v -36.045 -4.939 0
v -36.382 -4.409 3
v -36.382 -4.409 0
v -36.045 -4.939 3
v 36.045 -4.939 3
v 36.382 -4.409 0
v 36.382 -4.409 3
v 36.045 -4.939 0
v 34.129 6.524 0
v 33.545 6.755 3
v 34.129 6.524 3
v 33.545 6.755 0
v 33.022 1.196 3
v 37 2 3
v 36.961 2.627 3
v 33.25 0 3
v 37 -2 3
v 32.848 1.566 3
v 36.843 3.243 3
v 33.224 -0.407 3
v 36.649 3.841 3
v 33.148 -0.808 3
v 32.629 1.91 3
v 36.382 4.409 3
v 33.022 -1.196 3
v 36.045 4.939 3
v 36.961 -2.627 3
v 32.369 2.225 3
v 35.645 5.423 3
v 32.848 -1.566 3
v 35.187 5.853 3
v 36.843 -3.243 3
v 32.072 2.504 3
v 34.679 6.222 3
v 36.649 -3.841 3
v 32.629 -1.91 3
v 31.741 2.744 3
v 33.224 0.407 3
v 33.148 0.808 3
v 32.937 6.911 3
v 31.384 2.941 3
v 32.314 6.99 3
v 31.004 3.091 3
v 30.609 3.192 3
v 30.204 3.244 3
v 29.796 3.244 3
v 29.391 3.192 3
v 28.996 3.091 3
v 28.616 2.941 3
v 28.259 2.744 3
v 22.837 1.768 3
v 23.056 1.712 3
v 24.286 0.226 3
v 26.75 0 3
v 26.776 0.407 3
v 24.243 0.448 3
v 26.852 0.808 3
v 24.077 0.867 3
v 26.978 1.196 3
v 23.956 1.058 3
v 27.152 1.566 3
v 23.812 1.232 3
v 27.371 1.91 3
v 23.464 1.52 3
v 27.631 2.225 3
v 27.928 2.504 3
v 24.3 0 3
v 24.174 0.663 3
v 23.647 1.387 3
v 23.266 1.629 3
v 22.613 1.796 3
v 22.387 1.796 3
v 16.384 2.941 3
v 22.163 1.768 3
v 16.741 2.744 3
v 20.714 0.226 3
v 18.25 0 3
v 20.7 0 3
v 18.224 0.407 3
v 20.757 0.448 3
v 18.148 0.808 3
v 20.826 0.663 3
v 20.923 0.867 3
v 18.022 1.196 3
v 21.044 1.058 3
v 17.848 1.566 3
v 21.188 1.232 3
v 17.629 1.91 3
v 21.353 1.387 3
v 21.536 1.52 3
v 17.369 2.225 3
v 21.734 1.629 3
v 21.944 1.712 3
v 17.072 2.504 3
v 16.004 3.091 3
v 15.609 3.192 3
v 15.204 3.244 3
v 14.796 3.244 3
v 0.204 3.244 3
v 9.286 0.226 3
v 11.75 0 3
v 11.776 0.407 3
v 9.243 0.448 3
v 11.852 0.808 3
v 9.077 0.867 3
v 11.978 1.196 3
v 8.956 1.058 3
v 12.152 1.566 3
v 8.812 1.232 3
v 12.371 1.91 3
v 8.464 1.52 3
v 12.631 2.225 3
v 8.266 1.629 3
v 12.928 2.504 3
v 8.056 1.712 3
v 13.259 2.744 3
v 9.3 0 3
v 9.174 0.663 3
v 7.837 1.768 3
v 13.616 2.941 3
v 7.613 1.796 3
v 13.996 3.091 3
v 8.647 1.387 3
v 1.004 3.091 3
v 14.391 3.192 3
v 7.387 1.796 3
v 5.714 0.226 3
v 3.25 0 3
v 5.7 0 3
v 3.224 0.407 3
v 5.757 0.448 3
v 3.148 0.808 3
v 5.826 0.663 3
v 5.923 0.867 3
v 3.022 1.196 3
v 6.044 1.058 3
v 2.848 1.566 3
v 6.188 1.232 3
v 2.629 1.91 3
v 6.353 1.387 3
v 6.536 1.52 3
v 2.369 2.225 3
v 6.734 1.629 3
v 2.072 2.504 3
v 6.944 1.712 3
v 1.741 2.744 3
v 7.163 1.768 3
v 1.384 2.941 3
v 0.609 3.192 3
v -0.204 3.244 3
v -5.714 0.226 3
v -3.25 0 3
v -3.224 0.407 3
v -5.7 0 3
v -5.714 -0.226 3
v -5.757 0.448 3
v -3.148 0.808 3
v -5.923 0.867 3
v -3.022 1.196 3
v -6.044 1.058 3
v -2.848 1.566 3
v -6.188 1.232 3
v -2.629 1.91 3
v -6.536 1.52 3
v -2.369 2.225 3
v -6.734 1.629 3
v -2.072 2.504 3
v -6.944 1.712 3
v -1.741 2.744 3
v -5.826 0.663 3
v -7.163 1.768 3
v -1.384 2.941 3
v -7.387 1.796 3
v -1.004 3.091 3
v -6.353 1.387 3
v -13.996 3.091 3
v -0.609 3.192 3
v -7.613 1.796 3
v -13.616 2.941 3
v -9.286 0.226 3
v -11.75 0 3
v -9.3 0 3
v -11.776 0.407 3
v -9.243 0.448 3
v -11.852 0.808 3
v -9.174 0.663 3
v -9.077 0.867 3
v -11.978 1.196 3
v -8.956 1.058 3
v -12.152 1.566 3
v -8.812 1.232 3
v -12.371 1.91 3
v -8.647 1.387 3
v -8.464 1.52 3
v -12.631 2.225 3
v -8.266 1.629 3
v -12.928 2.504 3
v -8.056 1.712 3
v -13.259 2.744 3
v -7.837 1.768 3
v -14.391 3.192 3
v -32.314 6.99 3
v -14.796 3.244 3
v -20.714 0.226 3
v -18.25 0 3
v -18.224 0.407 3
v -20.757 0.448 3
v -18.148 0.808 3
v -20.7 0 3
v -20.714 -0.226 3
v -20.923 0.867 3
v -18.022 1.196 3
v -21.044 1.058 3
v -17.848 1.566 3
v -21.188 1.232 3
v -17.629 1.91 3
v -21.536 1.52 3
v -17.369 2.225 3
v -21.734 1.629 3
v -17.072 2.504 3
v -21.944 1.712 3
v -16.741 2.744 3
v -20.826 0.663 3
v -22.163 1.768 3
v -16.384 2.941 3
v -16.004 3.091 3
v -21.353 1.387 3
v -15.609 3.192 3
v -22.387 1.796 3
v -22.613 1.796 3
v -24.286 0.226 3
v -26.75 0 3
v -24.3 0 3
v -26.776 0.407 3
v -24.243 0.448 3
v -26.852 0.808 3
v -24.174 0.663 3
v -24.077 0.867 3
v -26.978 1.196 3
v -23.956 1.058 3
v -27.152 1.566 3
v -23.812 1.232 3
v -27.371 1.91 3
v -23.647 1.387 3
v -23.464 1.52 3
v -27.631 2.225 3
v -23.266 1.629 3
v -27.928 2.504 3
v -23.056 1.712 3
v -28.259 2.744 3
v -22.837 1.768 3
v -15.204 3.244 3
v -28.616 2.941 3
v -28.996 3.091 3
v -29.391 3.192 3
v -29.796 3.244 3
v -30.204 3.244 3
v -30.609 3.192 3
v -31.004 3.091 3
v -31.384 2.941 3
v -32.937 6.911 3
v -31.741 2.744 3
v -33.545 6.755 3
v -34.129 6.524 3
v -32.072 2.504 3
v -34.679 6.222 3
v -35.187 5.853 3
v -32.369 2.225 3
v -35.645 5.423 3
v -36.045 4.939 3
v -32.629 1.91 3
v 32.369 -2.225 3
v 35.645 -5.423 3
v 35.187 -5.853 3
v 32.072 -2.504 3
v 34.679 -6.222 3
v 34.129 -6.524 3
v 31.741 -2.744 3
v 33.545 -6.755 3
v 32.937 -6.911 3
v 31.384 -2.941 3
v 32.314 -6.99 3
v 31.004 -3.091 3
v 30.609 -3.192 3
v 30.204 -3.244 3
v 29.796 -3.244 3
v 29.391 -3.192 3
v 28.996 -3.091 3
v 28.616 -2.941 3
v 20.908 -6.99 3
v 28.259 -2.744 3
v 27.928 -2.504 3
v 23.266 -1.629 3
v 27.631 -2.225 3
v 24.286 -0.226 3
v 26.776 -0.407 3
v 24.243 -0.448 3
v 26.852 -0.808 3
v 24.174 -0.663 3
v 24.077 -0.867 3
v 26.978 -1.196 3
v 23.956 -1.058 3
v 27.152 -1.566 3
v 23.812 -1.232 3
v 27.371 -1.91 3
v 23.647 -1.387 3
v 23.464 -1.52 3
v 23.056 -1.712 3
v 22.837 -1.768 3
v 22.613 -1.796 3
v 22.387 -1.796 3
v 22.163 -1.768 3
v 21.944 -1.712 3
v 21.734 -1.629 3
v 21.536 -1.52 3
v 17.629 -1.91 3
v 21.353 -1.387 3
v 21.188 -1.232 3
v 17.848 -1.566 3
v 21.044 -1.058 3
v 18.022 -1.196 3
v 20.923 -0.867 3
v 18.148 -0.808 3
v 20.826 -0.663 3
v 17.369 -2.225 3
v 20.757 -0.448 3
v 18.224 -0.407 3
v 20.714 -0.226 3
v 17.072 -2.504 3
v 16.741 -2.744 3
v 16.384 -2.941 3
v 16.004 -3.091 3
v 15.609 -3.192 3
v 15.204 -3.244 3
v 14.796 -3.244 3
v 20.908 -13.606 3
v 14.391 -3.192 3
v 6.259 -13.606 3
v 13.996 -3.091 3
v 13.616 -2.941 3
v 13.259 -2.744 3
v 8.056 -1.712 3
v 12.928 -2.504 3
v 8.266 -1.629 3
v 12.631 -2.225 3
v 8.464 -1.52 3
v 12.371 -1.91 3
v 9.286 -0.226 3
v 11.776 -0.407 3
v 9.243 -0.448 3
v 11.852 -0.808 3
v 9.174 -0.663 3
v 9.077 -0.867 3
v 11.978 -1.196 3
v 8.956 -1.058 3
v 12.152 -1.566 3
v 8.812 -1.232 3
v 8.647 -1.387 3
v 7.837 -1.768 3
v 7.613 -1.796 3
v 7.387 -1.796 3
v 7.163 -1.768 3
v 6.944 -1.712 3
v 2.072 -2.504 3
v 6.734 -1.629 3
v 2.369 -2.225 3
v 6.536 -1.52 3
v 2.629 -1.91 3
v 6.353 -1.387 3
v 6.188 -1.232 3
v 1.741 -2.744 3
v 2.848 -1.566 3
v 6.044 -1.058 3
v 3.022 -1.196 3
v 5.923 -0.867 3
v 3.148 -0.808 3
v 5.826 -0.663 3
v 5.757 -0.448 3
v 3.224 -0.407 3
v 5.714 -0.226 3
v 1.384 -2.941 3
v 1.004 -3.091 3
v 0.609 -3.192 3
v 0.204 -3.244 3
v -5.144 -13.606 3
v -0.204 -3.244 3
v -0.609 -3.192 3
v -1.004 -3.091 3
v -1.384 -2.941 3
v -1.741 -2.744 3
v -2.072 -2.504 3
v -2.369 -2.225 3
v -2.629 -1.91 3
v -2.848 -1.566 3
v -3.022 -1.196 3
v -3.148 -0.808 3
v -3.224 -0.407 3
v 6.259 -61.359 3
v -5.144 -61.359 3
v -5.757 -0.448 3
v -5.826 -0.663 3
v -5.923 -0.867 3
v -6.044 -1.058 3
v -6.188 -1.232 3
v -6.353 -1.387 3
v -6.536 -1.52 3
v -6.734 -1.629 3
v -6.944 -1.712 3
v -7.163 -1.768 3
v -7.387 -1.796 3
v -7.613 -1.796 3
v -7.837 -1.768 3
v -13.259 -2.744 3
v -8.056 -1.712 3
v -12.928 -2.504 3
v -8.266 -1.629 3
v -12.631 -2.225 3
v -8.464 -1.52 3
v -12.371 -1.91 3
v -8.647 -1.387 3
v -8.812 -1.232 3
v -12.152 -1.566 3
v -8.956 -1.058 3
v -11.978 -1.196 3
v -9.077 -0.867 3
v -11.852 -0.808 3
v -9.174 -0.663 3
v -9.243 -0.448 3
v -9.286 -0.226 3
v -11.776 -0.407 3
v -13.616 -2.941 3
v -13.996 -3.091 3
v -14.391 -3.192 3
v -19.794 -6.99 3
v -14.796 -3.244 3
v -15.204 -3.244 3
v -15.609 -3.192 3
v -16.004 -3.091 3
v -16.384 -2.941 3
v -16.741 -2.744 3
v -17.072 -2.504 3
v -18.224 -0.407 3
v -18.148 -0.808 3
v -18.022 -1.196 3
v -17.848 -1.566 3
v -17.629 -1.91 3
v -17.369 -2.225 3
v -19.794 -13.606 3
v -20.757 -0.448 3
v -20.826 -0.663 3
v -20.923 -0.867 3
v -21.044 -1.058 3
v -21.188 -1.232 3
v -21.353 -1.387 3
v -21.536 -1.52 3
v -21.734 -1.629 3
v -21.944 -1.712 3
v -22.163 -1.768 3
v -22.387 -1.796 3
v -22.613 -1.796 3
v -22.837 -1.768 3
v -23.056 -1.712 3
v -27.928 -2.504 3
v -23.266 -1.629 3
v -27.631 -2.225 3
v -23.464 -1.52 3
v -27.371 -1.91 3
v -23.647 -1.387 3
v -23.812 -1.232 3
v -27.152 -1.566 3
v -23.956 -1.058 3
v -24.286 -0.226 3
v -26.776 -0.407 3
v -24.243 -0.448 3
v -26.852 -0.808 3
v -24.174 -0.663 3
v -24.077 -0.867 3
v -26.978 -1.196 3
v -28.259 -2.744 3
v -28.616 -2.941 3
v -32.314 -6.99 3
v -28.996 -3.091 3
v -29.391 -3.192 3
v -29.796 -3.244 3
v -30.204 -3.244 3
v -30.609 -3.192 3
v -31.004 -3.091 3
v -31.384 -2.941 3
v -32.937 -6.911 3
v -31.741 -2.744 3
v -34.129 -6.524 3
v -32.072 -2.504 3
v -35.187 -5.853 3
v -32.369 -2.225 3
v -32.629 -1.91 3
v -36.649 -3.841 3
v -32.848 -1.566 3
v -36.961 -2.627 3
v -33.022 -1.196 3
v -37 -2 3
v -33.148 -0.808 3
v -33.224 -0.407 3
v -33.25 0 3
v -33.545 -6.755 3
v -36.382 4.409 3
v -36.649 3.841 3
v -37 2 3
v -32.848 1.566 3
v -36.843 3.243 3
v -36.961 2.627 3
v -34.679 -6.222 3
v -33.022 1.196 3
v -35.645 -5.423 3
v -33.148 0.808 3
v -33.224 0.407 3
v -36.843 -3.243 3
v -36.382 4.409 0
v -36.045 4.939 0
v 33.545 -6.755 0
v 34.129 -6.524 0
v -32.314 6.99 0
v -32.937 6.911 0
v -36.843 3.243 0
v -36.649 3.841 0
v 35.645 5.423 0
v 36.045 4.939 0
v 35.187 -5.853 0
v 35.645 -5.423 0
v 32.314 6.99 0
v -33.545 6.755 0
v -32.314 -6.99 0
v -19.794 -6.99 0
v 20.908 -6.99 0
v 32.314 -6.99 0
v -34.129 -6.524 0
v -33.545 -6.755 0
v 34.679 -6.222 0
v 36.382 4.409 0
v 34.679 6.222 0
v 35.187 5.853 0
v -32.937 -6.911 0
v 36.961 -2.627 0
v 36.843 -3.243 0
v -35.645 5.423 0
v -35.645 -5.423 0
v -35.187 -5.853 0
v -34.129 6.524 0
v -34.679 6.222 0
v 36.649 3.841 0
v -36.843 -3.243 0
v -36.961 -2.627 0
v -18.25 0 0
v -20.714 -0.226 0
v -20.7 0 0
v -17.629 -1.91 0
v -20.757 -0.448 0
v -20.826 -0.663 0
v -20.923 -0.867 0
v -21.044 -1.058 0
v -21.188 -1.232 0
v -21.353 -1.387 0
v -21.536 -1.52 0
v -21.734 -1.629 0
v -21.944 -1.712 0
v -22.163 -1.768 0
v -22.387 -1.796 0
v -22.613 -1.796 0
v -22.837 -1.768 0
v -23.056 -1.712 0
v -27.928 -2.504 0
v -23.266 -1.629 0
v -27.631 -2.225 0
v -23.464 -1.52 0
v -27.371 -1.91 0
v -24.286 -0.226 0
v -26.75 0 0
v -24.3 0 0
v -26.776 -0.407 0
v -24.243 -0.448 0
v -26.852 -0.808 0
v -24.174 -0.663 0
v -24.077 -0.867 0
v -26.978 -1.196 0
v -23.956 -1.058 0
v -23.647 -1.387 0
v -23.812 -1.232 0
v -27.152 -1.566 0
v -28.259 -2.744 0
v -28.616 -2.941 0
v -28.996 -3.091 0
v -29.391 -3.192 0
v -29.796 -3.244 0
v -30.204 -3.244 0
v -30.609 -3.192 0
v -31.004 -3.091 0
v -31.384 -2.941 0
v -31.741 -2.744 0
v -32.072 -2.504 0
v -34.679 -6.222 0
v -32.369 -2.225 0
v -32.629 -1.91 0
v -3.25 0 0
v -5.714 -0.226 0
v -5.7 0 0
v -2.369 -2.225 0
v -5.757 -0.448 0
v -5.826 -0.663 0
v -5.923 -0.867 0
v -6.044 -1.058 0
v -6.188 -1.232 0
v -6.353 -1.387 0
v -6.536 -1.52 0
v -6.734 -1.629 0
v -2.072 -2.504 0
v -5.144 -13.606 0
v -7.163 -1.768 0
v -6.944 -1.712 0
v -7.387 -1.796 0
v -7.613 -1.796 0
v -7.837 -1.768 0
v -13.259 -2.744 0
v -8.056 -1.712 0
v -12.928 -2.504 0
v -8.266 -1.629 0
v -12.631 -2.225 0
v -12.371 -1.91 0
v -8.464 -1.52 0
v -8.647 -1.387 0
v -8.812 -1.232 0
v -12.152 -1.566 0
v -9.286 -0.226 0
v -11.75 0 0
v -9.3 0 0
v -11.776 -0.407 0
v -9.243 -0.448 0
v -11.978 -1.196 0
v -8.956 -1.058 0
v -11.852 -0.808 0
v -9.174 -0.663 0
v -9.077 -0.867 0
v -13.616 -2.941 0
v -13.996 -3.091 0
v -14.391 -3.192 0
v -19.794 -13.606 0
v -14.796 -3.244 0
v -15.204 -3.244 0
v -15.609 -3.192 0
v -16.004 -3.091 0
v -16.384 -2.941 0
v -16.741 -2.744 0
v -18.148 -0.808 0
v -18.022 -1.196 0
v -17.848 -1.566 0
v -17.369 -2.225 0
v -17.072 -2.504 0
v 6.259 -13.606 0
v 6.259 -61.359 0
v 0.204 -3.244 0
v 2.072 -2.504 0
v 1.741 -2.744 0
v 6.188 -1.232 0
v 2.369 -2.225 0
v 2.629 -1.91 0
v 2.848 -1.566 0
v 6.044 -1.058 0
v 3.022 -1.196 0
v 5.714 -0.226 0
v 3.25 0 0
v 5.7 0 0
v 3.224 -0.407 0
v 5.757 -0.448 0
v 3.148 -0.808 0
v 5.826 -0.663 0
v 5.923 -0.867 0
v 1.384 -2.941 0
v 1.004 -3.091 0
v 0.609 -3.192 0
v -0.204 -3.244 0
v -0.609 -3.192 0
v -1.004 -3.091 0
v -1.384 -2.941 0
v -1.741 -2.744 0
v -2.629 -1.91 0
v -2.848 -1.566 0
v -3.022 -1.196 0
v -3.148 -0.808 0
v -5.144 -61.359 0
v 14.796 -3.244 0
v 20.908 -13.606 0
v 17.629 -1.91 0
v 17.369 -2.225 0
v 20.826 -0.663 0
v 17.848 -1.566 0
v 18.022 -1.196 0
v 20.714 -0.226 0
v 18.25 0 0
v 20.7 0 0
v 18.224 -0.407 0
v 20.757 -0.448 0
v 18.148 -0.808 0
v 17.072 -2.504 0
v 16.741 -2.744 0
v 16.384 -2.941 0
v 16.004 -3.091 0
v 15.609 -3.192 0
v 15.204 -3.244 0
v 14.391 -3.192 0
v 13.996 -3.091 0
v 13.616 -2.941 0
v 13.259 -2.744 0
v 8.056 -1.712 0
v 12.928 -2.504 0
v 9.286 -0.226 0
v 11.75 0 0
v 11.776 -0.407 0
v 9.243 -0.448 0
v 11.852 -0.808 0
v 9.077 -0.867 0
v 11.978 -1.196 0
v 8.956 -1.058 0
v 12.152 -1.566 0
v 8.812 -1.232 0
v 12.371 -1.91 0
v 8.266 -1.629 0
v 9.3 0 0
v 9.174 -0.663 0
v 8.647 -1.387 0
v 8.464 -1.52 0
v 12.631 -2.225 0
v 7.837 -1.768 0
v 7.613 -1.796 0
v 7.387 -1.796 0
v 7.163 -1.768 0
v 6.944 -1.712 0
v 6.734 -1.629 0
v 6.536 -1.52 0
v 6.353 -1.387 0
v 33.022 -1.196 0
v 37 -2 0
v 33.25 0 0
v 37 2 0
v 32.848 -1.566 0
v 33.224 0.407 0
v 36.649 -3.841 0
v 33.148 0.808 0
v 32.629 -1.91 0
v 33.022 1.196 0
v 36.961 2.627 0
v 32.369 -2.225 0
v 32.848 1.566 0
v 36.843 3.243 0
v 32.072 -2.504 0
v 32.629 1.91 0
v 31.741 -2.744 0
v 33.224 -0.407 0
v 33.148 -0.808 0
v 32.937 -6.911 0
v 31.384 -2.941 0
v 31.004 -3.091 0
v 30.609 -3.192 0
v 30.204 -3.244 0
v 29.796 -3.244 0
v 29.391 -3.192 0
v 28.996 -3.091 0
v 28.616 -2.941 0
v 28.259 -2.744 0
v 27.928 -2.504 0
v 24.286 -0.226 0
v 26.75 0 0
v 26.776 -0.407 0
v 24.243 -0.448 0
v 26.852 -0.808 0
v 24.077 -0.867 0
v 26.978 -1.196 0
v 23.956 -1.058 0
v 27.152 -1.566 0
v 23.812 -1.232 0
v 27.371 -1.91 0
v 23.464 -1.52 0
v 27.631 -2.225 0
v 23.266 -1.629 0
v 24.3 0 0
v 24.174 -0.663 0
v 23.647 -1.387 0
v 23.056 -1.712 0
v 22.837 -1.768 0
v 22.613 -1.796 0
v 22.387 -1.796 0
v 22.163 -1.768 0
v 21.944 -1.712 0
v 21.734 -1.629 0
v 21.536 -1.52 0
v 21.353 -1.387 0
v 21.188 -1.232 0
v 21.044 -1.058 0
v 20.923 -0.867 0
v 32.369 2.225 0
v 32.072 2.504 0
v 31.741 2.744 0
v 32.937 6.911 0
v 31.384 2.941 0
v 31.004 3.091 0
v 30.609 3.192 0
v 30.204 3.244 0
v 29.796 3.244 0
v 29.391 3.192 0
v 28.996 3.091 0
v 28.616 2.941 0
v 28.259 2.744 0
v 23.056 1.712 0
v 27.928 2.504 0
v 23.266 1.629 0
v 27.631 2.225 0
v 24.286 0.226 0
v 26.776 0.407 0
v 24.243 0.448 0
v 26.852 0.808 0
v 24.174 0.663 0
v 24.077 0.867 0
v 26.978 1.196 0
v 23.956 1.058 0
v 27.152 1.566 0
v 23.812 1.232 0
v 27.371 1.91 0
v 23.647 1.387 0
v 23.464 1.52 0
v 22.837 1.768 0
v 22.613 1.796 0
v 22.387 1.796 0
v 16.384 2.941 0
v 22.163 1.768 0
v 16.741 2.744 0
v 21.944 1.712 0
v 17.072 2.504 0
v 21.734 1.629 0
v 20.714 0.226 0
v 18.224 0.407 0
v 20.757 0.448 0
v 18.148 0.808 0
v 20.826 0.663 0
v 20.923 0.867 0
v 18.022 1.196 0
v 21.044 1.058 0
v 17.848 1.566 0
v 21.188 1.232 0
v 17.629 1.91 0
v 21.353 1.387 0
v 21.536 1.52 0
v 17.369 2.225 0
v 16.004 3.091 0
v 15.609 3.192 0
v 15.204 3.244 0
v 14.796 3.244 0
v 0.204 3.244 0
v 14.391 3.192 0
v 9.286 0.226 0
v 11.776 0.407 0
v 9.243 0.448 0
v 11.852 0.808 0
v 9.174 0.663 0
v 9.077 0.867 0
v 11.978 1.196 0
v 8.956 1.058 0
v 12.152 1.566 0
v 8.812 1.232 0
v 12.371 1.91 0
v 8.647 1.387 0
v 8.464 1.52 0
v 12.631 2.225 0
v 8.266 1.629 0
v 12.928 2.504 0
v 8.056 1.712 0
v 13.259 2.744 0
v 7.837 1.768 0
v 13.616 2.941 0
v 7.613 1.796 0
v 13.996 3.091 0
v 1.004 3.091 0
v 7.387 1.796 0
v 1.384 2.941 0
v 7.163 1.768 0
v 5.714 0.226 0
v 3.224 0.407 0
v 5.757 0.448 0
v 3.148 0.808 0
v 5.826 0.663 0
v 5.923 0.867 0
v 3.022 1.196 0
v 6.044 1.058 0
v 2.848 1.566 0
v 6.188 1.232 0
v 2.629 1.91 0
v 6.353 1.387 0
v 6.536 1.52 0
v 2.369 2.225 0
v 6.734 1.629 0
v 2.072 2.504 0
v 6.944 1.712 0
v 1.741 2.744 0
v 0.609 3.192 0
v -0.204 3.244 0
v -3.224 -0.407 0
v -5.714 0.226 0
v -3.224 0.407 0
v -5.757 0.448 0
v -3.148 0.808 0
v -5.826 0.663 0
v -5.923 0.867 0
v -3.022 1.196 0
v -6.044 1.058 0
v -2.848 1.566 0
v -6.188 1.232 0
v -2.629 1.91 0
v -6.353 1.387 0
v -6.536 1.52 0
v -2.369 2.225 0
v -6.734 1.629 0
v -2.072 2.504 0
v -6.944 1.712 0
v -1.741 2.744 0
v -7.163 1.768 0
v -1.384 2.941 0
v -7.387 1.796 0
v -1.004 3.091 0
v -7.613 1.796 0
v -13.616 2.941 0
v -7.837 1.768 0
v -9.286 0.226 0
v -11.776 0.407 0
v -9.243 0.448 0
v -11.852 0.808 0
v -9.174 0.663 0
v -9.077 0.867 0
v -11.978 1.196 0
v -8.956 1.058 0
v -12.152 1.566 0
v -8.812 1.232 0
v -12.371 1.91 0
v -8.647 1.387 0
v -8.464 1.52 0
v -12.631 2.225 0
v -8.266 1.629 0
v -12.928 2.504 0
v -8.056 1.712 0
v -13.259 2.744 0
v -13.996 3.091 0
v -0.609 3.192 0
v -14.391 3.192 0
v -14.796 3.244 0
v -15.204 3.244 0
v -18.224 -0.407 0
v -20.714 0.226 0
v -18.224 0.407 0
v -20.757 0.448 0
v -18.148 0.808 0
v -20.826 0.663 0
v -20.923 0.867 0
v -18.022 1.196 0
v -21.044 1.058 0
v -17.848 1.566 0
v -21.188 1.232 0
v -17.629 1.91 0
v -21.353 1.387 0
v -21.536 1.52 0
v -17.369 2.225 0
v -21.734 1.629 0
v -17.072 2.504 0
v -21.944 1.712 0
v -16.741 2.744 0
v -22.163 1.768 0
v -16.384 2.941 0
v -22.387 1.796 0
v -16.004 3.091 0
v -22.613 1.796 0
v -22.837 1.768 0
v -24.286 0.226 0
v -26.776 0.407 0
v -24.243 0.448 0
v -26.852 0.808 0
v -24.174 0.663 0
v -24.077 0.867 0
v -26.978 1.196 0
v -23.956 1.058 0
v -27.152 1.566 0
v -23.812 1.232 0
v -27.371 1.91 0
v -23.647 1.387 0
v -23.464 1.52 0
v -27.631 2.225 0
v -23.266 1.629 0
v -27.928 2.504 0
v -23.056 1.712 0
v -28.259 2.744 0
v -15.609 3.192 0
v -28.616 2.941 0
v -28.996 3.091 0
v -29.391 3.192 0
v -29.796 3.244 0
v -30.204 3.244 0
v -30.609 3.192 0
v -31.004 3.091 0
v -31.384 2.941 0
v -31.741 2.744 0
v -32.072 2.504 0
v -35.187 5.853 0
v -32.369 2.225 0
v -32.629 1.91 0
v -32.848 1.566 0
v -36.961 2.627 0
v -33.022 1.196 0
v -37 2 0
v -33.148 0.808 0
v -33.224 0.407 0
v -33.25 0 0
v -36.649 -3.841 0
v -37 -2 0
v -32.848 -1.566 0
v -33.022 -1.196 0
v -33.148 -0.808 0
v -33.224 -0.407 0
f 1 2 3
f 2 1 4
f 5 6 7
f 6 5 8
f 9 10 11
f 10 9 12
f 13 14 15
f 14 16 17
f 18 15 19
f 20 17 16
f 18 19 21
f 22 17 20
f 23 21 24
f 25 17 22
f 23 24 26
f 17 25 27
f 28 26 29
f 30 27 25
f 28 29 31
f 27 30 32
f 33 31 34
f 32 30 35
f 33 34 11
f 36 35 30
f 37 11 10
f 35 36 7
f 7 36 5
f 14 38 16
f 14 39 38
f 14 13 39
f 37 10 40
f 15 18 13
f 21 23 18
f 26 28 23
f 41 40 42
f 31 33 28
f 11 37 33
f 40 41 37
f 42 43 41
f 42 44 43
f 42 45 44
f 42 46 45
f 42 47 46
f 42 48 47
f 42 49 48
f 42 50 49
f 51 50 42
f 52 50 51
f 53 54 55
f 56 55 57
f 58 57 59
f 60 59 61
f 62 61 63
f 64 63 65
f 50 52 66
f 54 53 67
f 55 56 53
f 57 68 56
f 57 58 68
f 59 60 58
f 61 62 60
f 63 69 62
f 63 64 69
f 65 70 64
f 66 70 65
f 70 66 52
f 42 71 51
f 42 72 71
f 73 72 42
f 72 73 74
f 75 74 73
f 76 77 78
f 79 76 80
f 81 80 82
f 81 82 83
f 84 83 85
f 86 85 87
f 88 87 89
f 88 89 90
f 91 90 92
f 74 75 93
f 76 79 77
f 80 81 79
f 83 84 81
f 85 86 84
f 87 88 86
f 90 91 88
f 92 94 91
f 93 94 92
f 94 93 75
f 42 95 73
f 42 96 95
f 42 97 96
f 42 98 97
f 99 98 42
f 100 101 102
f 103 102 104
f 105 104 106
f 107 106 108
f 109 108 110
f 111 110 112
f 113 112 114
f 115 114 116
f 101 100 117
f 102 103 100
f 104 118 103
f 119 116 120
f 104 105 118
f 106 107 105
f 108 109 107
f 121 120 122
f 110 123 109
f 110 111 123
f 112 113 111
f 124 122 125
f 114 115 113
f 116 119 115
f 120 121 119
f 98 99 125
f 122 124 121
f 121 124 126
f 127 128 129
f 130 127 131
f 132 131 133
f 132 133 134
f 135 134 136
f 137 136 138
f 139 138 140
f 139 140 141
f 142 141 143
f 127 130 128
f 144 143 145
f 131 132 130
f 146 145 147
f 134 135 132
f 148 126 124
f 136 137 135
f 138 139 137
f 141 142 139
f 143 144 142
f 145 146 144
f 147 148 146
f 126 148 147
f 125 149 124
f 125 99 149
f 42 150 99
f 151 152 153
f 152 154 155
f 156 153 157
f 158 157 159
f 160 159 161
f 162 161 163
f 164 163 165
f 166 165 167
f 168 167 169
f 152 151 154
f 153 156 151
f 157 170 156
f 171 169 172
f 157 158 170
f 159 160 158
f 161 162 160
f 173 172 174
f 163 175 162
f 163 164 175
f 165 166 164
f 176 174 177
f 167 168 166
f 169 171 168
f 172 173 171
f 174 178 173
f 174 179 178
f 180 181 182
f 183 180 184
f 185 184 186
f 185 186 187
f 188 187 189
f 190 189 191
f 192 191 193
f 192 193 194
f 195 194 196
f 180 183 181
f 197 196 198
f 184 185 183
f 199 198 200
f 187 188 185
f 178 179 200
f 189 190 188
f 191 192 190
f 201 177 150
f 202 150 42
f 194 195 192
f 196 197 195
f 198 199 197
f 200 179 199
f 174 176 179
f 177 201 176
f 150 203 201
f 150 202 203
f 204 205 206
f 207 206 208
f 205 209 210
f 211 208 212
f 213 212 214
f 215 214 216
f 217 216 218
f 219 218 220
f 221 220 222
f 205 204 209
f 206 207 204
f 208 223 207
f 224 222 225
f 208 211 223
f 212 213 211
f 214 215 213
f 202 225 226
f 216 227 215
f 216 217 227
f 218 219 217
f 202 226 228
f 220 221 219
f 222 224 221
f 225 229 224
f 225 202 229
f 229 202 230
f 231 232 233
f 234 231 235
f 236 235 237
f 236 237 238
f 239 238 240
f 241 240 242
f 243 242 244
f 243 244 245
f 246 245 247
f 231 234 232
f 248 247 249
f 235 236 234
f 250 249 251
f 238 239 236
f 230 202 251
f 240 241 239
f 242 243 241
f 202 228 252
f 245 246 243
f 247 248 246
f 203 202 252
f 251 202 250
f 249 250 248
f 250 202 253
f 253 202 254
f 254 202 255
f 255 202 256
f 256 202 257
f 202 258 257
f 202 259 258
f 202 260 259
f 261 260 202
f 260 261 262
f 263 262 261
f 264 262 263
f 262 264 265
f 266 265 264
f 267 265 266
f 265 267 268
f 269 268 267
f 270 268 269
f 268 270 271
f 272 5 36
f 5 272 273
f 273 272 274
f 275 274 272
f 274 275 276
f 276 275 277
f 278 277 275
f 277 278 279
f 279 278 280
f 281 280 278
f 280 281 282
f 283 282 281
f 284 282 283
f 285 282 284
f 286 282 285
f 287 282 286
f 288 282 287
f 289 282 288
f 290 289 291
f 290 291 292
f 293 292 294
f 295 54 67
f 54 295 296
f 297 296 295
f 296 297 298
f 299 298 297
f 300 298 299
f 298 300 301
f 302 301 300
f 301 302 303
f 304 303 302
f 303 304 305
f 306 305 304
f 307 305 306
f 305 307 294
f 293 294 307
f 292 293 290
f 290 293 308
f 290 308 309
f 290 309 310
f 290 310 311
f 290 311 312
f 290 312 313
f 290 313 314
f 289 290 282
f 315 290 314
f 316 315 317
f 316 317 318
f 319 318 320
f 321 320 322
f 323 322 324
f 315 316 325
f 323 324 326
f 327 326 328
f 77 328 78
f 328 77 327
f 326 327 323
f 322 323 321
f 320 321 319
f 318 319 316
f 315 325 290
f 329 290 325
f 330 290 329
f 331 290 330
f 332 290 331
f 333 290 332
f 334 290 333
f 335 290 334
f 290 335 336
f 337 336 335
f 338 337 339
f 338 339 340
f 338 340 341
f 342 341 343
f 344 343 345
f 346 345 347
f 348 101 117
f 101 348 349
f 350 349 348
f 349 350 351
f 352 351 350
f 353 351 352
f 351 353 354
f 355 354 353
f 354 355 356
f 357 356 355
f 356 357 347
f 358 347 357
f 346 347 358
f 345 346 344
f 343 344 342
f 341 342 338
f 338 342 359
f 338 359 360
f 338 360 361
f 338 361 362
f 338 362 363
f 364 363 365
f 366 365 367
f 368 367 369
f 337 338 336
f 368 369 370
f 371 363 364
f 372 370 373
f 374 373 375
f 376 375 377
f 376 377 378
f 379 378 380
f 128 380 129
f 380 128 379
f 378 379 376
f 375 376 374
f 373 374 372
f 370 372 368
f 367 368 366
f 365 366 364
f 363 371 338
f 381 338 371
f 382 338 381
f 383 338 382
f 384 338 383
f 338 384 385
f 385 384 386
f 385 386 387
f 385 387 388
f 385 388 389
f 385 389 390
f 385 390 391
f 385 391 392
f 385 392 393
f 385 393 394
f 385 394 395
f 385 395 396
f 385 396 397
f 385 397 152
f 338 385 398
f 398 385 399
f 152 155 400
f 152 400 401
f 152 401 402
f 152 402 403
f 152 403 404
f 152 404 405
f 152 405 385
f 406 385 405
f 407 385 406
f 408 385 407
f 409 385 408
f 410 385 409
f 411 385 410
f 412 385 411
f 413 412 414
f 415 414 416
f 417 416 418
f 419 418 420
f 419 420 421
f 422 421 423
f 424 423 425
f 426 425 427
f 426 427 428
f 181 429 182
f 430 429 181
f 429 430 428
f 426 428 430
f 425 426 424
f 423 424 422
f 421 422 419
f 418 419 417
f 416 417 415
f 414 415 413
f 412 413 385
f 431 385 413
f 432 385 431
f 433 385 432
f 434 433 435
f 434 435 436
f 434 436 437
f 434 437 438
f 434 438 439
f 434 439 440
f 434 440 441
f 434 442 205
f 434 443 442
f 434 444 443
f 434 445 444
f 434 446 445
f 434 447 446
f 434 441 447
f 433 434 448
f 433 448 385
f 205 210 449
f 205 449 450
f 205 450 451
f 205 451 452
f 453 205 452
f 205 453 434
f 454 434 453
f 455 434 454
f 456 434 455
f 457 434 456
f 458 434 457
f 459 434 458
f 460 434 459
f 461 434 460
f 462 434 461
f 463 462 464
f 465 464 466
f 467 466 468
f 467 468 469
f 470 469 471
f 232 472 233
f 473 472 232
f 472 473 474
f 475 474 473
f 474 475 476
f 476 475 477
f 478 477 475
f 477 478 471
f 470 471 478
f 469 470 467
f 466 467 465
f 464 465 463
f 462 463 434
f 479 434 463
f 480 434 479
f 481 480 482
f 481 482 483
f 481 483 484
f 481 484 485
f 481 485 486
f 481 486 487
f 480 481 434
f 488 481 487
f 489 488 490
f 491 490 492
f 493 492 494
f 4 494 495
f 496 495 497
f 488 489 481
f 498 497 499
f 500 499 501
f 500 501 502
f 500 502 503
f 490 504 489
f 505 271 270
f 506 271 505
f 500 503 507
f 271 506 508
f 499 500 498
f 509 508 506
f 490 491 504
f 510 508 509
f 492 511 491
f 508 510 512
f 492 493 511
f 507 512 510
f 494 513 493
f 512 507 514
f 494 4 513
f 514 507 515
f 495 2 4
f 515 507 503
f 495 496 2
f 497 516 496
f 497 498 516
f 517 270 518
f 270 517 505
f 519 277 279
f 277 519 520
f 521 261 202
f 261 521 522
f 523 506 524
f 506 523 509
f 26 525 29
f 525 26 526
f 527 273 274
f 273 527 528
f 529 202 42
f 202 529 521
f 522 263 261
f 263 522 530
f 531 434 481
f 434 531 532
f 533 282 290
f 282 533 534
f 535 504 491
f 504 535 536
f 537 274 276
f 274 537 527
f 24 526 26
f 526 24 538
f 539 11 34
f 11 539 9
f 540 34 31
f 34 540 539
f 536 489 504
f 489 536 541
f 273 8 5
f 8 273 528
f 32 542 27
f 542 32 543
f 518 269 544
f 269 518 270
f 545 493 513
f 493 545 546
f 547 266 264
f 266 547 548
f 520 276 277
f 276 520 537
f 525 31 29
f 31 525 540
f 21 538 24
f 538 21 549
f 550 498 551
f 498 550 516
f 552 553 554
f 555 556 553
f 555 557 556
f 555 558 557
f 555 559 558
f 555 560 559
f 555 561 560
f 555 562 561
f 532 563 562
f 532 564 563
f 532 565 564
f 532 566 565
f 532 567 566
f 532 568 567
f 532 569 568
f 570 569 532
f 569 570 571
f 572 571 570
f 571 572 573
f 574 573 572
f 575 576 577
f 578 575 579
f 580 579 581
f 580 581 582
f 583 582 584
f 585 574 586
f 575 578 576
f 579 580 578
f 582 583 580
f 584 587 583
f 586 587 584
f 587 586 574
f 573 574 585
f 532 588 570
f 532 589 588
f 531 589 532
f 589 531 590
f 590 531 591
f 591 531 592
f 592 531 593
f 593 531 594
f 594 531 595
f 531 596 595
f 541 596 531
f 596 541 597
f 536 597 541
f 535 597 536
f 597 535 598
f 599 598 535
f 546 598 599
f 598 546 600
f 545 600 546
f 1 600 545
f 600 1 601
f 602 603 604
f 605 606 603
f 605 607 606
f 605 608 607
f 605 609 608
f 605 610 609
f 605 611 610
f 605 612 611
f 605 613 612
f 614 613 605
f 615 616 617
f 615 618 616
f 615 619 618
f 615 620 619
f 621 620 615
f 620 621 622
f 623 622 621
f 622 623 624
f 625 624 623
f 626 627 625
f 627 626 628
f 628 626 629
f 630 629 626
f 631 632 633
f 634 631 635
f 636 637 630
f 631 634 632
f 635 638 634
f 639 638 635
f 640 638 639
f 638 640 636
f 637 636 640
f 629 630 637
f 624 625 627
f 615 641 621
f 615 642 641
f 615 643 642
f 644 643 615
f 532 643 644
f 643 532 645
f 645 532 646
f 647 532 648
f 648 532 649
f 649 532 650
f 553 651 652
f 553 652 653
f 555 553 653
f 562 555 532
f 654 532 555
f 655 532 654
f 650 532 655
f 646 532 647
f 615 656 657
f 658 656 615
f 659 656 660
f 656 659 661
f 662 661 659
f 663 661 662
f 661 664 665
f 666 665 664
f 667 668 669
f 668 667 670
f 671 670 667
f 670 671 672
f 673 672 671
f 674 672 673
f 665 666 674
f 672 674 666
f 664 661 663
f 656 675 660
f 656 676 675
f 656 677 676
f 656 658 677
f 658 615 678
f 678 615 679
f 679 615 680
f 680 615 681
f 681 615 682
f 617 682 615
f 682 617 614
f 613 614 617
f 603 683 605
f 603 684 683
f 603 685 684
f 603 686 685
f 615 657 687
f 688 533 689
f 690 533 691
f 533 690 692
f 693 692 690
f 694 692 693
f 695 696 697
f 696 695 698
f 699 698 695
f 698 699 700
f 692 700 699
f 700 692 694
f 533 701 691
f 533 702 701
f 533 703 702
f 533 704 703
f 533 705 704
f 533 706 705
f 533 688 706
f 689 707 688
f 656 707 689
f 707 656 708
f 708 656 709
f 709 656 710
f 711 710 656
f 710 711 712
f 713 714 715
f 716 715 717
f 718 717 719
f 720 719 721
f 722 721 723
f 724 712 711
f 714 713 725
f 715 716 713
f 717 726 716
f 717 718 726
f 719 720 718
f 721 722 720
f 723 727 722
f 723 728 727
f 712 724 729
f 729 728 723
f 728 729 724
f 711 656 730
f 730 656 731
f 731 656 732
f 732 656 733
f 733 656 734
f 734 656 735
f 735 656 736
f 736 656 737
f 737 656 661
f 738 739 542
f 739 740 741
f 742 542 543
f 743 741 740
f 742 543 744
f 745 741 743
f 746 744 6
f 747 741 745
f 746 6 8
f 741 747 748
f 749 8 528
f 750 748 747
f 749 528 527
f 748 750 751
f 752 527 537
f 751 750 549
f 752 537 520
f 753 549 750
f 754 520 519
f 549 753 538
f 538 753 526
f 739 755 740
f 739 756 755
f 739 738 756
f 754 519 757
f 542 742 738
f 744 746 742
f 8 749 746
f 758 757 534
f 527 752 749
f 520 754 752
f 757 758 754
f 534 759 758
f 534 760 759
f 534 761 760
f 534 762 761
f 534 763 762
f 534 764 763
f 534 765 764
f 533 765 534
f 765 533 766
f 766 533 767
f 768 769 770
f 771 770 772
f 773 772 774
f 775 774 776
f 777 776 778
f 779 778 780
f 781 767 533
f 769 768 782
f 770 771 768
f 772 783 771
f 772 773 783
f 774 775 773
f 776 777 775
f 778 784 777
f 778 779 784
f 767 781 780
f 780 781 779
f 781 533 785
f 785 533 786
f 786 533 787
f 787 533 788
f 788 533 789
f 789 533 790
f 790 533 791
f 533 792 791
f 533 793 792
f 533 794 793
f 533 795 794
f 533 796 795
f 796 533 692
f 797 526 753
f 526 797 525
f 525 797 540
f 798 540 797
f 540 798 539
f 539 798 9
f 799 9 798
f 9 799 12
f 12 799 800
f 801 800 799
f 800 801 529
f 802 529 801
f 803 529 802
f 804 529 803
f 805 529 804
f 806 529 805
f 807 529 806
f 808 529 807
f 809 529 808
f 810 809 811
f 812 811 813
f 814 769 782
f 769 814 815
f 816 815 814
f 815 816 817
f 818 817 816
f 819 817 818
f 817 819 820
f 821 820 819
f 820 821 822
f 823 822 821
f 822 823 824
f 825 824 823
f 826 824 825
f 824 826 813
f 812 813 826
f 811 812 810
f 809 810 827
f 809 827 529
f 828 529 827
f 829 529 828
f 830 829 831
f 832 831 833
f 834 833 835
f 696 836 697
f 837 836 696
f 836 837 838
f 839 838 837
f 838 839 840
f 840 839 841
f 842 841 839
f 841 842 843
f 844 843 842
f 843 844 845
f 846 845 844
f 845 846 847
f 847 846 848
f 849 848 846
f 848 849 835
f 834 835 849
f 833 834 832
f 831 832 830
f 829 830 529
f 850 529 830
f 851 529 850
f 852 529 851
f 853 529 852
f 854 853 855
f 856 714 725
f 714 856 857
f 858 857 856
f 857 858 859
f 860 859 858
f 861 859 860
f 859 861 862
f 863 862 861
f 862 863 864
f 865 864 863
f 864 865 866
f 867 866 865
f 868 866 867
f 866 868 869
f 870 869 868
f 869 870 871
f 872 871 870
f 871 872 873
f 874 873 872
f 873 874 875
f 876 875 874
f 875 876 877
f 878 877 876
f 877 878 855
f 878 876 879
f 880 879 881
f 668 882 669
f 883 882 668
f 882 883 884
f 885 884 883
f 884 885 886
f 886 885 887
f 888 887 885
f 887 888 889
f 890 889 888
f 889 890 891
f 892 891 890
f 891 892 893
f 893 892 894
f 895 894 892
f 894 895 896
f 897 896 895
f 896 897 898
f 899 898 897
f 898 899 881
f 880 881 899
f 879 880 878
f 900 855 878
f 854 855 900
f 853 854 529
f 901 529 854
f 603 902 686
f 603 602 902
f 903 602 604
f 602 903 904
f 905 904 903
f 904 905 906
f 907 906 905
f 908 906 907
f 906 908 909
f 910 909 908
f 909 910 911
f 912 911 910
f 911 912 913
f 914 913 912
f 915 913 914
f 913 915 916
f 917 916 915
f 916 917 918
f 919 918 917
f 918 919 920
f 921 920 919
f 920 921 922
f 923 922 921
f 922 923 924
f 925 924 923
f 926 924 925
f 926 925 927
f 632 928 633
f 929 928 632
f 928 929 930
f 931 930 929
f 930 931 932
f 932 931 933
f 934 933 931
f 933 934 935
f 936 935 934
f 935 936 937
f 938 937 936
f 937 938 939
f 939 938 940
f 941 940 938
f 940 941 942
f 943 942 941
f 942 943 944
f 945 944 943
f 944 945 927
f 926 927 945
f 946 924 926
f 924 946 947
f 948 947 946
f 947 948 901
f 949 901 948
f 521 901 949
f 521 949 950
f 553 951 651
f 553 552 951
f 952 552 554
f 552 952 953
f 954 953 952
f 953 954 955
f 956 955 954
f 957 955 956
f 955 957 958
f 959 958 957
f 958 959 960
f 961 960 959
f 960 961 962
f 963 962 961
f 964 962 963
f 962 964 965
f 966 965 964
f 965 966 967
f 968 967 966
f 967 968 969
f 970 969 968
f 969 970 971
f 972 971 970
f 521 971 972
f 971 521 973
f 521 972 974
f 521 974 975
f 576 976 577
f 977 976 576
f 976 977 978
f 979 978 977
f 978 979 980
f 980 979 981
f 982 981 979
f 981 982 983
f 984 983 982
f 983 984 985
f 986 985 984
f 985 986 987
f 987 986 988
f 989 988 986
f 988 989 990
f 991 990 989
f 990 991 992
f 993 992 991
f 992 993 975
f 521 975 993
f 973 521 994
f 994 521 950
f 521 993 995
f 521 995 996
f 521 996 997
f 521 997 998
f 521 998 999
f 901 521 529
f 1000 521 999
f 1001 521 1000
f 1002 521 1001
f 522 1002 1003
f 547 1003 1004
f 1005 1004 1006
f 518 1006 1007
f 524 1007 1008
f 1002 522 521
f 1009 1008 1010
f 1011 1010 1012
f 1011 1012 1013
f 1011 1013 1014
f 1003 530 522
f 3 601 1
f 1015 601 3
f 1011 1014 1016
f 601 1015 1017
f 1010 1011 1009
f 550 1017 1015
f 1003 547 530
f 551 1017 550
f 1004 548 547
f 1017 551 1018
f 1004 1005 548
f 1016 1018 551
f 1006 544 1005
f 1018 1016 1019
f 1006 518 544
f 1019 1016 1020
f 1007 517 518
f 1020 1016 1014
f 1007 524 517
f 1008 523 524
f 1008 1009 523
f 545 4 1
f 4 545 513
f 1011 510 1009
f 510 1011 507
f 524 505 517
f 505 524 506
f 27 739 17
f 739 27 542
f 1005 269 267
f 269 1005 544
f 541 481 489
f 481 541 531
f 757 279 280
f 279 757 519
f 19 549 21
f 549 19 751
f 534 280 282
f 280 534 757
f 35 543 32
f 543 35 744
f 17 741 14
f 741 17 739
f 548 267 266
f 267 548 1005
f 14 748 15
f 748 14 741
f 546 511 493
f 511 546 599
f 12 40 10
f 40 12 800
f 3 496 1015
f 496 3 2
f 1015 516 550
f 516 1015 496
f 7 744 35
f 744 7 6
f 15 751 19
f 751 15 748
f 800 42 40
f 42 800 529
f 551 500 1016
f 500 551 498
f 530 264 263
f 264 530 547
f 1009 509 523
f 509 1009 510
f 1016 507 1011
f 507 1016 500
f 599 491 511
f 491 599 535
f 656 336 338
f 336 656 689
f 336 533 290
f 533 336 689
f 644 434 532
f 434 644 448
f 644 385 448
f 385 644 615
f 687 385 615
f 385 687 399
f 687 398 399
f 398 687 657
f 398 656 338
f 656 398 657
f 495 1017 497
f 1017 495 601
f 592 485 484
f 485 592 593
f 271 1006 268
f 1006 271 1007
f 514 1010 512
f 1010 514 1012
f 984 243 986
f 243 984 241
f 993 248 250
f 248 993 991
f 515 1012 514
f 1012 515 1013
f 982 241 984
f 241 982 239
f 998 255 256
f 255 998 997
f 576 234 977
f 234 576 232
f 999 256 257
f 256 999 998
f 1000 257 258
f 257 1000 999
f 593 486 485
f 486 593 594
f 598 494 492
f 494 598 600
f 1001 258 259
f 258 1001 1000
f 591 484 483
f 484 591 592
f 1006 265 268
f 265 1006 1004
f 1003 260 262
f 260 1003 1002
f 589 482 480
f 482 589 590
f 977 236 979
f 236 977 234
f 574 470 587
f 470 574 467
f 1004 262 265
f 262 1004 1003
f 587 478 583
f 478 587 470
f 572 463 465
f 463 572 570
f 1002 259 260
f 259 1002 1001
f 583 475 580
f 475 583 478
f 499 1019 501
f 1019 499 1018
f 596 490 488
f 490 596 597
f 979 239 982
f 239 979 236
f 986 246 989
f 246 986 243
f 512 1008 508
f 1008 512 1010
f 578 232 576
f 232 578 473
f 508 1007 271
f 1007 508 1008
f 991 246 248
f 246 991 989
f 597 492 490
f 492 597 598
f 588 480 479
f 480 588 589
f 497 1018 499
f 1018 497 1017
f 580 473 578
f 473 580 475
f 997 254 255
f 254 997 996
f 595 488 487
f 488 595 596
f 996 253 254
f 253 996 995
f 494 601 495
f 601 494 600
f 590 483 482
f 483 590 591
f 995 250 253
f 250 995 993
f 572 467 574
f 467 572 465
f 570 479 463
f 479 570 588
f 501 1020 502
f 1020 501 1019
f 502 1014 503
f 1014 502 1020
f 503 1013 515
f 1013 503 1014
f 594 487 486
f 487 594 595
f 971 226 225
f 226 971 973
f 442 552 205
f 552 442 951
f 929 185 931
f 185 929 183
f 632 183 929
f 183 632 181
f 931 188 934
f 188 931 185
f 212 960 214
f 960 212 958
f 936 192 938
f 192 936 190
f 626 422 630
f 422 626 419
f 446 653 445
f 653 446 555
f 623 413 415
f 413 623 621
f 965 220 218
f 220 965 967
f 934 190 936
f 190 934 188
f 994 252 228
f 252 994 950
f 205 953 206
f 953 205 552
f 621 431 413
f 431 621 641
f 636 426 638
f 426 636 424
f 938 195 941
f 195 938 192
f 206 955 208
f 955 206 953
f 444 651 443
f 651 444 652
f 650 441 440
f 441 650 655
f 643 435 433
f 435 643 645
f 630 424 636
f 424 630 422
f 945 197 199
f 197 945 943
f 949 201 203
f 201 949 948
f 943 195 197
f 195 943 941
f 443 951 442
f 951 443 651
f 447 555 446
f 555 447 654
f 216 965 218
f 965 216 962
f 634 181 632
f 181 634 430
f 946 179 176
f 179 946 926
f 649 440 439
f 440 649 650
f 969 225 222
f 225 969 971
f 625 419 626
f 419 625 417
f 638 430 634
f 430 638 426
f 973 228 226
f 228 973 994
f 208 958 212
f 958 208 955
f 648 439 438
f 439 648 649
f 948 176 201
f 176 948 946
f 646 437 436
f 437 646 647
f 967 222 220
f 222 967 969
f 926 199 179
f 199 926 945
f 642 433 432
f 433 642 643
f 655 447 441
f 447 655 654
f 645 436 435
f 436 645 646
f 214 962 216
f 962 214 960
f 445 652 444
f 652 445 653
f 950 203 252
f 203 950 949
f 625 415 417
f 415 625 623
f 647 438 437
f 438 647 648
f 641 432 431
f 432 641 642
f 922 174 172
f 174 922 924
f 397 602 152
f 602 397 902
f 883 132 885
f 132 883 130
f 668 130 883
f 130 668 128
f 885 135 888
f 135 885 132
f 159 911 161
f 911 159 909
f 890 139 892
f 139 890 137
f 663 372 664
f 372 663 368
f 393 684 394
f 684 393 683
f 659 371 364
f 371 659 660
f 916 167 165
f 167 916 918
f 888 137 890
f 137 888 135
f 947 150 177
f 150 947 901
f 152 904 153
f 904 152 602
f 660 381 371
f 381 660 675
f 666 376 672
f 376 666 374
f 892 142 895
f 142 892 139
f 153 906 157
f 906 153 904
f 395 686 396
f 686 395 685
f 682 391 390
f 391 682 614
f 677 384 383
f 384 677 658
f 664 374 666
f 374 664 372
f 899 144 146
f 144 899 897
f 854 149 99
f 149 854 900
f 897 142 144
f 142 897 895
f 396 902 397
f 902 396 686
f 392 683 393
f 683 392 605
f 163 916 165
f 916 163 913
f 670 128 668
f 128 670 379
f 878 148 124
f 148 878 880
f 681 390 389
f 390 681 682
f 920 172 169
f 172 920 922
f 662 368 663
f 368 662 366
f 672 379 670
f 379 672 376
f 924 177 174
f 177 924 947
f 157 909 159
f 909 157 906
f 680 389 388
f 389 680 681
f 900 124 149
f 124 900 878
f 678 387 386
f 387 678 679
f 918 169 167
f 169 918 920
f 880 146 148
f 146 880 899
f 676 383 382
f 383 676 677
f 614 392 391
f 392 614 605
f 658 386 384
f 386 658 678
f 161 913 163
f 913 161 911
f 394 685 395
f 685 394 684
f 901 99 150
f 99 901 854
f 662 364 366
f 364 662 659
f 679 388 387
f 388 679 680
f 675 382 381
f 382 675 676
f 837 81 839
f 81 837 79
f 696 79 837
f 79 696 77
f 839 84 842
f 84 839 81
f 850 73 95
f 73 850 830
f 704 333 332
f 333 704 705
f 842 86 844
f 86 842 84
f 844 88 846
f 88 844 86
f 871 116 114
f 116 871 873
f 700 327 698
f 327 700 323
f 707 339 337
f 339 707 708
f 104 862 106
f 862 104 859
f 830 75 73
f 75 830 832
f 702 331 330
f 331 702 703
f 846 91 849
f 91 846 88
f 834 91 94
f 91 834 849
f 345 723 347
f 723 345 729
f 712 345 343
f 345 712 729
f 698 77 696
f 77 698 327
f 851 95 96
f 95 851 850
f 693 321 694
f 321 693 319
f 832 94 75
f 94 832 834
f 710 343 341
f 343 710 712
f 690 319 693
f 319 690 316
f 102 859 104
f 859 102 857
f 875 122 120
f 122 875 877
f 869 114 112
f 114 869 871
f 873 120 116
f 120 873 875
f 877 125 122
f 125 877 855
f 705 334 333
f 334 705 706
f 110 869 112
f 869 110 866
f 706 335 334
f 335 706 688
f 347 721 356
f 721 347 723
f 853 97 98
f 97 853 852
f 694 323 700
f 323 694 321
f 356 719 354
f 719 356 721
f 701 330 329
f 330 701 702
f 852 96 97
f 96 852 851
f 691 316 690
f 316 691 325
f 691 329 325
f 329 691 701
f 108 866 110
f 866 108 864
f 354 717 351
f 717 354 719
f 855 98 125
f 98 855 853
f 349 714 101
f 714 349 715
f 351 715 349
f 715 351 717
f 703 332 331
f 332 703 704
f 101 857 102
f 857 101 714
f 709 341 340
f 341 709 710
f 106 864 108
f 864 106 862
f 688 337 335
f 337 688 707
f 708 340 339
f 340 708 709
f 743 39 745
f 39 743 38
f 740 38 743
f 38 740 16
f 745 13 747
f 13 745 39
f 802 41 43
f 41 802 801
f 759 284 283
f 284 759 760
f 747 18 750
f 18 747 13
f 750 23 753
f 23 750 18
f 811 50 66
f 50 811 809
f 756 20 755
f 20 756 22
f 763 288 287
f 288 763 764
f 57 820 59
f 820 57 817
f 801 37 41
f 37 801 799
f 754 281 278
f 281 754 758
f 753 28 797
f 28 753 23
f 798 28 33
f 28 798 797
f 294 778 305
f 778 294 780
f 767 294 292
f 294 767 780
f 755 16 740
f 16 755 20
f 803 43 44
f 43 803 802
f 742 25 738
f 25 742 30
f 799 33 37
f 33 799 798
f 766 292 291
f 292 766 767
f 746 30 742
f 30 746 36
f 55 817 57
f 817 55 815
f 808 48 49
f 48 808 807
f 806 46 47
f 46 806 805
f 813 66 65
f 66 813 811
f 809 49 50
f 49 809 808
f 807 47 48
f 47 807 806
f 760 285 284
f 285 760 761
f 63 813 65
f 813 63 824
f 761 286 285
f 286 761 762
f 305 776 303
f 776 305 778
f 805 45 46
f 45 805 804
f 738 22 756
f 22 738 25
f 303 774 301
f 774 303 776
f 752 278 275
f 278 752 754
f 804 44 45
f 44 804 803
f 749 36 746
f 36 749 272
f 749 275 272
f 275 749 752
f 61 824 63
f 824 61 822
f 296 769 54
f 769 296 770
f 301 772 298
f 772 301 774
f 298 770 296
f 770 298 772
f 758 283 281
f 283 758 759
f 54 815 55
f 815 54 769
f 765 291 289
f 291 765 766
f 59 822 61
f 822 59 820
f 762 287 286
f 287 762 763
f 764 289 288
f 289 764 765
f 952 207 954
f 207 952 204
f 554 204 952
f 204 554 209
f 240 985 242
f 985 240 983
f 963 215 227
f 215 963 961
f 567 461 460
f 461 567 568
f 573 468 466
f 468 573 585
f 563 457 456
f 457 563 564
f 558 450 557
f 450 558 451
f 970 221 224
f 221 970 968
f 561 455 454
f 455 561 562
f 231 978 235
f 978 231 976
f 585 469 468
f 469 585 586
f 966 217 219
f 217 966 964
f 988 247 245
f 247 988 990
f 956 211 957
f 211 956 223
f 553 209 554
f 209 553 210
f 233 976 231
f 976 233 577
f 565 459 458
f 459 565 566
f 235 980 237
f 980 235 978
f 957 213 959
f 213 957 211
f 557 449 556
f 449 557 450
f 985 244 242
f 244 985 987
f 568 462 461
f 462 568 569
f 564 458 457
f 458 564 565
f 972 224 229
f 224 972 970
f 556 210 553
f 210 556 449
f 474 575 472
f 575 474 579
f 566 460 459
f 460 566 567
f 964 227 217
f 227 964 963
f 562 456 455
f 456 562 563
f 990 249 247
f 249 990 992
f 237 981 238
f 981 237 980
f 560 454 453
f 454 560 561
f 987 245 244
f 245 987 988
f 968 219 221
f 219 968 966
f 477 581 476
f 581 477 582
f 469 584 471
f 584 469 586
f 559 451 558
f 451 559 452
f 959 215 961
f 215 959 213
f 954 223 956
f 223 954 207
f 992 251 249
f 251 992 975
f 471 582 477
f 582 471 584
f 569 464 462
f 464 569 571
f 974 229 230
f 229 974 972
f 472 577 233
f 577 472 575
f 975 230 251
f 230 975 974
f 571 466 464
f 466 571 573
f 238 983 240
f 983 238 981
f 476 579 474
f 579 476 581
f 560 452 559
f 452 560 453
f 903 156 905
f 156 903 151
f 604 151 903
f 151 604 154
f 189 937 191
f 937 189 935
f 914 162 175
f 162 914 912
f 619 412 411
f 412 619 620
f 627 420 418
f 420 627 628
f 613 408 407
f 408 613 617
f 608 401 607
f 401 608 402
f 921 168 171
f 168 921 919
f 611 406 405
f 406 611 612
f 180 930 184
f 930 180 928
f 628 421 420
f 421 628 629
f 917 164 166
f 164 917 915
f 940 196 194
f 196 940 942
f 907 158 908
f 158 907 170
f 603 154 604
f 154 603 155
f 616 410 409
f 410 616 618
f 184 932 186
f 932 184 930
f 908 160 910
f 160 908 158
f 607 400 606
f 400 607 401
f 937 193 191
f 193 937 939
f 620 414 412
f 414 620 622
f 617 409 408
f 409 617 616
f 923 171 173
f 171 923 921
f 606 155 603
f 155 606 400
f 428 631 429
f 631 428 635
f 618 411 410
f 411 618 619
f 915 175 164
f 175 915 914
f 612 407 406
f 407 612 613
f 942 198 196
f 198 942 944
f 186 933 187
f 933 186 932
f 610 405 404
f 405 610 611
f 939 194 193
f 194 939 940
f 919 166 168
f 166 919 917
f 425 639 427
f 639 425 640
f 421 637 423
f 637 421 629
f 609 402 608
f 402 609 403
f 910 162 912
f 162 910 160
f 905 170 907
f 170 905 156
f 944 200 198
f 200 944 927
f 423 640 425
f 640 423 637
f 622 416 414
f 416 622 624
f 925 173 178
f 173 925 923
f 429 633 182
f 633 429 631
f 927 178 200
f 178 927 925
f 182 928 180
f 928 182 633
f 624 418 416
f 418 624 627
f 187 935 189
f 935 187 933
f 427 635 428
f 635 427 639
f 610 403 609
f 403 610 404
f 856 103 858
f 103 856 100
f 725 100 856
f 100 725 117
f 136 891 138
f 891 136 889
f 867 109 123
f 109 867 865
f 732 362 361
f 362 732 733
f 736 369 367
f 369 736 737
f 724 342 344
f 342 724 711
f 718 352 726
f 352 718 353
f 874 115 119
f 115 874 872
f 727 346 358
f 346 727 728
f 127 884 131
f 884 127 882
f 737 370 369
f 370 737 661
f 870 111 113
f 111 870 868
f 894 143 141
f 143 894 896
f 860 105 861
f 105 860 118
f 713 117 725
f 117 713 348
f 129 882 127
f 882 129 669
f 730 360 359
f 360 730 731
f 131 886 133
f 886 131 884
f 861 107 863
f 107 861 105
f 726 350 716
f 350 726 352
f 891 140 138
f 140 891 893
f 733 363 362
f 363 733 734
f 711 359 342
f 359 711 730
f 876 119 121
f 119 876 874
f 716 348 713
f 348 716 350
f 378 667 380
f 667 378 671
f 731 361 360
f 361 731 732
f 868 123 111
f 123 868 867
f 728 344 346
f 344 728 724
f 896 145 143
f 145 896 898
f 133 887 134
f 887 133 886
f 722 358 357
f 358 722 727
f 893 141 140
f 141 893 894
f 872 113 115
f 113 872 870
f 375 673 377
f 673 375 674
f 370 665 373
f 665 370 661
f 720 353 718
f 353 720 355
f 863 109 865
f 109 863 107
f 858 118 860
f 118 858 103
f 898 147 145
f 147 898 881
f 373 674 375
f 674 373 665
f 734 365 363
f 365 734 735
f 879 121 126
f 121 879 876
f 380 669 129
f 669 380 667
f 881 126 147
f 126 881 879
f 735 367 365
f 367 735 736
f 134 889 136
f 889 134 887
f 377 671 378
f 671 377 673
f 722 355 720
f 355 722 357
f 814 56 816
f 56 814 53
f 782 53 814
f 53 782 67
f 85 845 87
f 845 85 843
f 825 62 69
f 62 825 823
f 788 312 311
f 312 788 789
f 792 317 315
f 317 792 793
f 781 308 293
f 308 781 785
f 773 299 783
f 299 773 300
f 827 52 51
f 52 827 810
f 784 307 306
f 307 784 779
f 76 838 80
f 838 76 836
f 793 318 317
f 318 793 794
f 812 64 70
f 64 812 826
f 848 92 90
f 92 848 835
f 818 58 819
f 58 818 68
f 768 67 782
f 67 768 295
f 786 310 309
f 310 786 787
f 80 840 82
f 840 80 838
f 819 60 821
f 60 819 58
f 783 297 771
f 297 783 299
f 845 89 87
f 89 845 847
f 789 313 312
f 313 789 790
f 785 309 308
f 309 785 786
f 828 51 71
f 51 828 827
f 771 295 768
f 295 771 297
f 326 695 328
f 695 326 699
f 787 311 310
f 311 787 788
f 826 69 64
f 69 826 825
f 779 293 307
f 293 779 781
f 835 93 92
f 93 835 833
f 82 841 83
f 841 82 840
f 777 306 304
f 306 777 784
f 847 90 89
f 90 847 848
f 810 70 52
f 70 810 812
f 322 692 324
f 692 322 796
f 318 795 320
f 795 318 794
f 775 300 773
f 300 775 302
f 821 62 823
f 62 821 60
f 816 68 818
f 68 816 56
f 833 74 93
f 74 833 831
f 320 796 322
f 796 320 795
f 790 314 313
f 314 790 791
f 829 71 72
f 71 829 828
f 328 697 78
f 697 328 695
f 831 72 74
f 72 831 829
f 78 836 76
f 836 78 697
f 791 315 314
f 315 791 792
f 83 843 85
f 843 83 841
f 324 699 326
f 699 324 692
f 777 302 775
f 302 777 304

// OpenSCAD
$fn = 50;


difference() {
	union() {
		hull() {
			translate(v = [-32.0000000000, 2.0000000000, 0]) {
				cylinder(h = 3, r = 5);
			}
			translate(v = [32.0000000000, 2.0000000000, 0]) {
				cylinder(h = 3, r = 5);
			}
			translate(v = [-32.0000000000, -2.0000000000, 0]) {
				cylinder(h = 3, r = 5);
			}
			translate(v = [32.0000000000, -2.0000000000, 0]) {
				cylinder(h = 3, r = 5);
			}
		}
		translate(v = [0, -5, 0]) {
			linear_extrude(height = 3) {
				text(font = "DejaVu Sans Mono:style=Bold", halign = "center", size = 57.0000000000, text = "T", valign = "top");
			}
		}
	}
	union() {
		translate(v = [-30.0000000000, 0.0000000000, 0]) {
			translate(v = [0, 0, -100]) {
				cylinder(h = 200, r = 3.2500000000);
			}
		}
		translate(v = [-15.0000000000, 0.0000000000, 0]) {
			translate(v = [0, 0, -100]) {
				cylinder(h = 200, r = 3.2500000000);
			}
		}
		translate(v = [0, 0, -100]) {
			cylinder(h = 200, r = 3.2500000000);
		}
		translate(v = [15.0000000000, 0.0000000000, 0]) {
			translate(v = [0, 0, -100]) {
				cylinder(h = 200, r = 3.2500000000);
			}
		}
		translate(v = [30.0000000000, 0.0000000000, 0]) {
			translate(v = [0, 0, -100]) {
				cylinder(h = 200, r = 3.2500000000);
			}
		}
		translate(v = [-30.0000000000, 0.0000000000, 0]) {
			translate(v = [0, 0, -100]) {
				cylinder(h = 200, r = 1.8000000000);
			}
		}
		translate(v = [-22.5000000000, 0.0000000000, 0]) {
			translate(v = [0, 0, -100]) {
				cylinder(h = 200, r = 1.8000000000);
			}
		}
		translate(v = [-15.0000000000, 0.0000000000, 0]) {
			translate(v = [0, 0, -100]) {
				cylinder(h = 200, r = 1.8000000000);
			}
		}
		translate(v = [-7.5000000000, 0.0000000000, 0]) {
			translate(v = [0, 0, -100]) {
				cylinder(h = 200, r = 1.8000000000);
			}
		}
		translate(v = [0, 0, -100]) {
			cylinder(h = 200, r = 1.8000000000);
		}
		translate(v = [7.5000000000, 0.0000000000, 0]) {
			translate(v = [0, 0, -100]) {
				cylinder(h = 200, r = 1.8000000000);
			}
		}
		translate(v = [15.0000000000, 0.0000000000, 0]) {
			translate(v = [0, 0, -100]) {
				cylinder(h = 200, r = 1.8000000000);
			}
		}
		translate(v = [22.5000000000, 0.0000000000, 0]) {
			translate(v = [0, 0, -100]) {
				cylinder(h = 200, r = 1.8000000000);
			}
		}
		translate(v = [30.0000000000, 0.0000000000, 0]) {
			translate(v = [0, 0, -100]) {
				cylinder(h = 200, r = 1.8000000000);
			}
		}
	}
}
